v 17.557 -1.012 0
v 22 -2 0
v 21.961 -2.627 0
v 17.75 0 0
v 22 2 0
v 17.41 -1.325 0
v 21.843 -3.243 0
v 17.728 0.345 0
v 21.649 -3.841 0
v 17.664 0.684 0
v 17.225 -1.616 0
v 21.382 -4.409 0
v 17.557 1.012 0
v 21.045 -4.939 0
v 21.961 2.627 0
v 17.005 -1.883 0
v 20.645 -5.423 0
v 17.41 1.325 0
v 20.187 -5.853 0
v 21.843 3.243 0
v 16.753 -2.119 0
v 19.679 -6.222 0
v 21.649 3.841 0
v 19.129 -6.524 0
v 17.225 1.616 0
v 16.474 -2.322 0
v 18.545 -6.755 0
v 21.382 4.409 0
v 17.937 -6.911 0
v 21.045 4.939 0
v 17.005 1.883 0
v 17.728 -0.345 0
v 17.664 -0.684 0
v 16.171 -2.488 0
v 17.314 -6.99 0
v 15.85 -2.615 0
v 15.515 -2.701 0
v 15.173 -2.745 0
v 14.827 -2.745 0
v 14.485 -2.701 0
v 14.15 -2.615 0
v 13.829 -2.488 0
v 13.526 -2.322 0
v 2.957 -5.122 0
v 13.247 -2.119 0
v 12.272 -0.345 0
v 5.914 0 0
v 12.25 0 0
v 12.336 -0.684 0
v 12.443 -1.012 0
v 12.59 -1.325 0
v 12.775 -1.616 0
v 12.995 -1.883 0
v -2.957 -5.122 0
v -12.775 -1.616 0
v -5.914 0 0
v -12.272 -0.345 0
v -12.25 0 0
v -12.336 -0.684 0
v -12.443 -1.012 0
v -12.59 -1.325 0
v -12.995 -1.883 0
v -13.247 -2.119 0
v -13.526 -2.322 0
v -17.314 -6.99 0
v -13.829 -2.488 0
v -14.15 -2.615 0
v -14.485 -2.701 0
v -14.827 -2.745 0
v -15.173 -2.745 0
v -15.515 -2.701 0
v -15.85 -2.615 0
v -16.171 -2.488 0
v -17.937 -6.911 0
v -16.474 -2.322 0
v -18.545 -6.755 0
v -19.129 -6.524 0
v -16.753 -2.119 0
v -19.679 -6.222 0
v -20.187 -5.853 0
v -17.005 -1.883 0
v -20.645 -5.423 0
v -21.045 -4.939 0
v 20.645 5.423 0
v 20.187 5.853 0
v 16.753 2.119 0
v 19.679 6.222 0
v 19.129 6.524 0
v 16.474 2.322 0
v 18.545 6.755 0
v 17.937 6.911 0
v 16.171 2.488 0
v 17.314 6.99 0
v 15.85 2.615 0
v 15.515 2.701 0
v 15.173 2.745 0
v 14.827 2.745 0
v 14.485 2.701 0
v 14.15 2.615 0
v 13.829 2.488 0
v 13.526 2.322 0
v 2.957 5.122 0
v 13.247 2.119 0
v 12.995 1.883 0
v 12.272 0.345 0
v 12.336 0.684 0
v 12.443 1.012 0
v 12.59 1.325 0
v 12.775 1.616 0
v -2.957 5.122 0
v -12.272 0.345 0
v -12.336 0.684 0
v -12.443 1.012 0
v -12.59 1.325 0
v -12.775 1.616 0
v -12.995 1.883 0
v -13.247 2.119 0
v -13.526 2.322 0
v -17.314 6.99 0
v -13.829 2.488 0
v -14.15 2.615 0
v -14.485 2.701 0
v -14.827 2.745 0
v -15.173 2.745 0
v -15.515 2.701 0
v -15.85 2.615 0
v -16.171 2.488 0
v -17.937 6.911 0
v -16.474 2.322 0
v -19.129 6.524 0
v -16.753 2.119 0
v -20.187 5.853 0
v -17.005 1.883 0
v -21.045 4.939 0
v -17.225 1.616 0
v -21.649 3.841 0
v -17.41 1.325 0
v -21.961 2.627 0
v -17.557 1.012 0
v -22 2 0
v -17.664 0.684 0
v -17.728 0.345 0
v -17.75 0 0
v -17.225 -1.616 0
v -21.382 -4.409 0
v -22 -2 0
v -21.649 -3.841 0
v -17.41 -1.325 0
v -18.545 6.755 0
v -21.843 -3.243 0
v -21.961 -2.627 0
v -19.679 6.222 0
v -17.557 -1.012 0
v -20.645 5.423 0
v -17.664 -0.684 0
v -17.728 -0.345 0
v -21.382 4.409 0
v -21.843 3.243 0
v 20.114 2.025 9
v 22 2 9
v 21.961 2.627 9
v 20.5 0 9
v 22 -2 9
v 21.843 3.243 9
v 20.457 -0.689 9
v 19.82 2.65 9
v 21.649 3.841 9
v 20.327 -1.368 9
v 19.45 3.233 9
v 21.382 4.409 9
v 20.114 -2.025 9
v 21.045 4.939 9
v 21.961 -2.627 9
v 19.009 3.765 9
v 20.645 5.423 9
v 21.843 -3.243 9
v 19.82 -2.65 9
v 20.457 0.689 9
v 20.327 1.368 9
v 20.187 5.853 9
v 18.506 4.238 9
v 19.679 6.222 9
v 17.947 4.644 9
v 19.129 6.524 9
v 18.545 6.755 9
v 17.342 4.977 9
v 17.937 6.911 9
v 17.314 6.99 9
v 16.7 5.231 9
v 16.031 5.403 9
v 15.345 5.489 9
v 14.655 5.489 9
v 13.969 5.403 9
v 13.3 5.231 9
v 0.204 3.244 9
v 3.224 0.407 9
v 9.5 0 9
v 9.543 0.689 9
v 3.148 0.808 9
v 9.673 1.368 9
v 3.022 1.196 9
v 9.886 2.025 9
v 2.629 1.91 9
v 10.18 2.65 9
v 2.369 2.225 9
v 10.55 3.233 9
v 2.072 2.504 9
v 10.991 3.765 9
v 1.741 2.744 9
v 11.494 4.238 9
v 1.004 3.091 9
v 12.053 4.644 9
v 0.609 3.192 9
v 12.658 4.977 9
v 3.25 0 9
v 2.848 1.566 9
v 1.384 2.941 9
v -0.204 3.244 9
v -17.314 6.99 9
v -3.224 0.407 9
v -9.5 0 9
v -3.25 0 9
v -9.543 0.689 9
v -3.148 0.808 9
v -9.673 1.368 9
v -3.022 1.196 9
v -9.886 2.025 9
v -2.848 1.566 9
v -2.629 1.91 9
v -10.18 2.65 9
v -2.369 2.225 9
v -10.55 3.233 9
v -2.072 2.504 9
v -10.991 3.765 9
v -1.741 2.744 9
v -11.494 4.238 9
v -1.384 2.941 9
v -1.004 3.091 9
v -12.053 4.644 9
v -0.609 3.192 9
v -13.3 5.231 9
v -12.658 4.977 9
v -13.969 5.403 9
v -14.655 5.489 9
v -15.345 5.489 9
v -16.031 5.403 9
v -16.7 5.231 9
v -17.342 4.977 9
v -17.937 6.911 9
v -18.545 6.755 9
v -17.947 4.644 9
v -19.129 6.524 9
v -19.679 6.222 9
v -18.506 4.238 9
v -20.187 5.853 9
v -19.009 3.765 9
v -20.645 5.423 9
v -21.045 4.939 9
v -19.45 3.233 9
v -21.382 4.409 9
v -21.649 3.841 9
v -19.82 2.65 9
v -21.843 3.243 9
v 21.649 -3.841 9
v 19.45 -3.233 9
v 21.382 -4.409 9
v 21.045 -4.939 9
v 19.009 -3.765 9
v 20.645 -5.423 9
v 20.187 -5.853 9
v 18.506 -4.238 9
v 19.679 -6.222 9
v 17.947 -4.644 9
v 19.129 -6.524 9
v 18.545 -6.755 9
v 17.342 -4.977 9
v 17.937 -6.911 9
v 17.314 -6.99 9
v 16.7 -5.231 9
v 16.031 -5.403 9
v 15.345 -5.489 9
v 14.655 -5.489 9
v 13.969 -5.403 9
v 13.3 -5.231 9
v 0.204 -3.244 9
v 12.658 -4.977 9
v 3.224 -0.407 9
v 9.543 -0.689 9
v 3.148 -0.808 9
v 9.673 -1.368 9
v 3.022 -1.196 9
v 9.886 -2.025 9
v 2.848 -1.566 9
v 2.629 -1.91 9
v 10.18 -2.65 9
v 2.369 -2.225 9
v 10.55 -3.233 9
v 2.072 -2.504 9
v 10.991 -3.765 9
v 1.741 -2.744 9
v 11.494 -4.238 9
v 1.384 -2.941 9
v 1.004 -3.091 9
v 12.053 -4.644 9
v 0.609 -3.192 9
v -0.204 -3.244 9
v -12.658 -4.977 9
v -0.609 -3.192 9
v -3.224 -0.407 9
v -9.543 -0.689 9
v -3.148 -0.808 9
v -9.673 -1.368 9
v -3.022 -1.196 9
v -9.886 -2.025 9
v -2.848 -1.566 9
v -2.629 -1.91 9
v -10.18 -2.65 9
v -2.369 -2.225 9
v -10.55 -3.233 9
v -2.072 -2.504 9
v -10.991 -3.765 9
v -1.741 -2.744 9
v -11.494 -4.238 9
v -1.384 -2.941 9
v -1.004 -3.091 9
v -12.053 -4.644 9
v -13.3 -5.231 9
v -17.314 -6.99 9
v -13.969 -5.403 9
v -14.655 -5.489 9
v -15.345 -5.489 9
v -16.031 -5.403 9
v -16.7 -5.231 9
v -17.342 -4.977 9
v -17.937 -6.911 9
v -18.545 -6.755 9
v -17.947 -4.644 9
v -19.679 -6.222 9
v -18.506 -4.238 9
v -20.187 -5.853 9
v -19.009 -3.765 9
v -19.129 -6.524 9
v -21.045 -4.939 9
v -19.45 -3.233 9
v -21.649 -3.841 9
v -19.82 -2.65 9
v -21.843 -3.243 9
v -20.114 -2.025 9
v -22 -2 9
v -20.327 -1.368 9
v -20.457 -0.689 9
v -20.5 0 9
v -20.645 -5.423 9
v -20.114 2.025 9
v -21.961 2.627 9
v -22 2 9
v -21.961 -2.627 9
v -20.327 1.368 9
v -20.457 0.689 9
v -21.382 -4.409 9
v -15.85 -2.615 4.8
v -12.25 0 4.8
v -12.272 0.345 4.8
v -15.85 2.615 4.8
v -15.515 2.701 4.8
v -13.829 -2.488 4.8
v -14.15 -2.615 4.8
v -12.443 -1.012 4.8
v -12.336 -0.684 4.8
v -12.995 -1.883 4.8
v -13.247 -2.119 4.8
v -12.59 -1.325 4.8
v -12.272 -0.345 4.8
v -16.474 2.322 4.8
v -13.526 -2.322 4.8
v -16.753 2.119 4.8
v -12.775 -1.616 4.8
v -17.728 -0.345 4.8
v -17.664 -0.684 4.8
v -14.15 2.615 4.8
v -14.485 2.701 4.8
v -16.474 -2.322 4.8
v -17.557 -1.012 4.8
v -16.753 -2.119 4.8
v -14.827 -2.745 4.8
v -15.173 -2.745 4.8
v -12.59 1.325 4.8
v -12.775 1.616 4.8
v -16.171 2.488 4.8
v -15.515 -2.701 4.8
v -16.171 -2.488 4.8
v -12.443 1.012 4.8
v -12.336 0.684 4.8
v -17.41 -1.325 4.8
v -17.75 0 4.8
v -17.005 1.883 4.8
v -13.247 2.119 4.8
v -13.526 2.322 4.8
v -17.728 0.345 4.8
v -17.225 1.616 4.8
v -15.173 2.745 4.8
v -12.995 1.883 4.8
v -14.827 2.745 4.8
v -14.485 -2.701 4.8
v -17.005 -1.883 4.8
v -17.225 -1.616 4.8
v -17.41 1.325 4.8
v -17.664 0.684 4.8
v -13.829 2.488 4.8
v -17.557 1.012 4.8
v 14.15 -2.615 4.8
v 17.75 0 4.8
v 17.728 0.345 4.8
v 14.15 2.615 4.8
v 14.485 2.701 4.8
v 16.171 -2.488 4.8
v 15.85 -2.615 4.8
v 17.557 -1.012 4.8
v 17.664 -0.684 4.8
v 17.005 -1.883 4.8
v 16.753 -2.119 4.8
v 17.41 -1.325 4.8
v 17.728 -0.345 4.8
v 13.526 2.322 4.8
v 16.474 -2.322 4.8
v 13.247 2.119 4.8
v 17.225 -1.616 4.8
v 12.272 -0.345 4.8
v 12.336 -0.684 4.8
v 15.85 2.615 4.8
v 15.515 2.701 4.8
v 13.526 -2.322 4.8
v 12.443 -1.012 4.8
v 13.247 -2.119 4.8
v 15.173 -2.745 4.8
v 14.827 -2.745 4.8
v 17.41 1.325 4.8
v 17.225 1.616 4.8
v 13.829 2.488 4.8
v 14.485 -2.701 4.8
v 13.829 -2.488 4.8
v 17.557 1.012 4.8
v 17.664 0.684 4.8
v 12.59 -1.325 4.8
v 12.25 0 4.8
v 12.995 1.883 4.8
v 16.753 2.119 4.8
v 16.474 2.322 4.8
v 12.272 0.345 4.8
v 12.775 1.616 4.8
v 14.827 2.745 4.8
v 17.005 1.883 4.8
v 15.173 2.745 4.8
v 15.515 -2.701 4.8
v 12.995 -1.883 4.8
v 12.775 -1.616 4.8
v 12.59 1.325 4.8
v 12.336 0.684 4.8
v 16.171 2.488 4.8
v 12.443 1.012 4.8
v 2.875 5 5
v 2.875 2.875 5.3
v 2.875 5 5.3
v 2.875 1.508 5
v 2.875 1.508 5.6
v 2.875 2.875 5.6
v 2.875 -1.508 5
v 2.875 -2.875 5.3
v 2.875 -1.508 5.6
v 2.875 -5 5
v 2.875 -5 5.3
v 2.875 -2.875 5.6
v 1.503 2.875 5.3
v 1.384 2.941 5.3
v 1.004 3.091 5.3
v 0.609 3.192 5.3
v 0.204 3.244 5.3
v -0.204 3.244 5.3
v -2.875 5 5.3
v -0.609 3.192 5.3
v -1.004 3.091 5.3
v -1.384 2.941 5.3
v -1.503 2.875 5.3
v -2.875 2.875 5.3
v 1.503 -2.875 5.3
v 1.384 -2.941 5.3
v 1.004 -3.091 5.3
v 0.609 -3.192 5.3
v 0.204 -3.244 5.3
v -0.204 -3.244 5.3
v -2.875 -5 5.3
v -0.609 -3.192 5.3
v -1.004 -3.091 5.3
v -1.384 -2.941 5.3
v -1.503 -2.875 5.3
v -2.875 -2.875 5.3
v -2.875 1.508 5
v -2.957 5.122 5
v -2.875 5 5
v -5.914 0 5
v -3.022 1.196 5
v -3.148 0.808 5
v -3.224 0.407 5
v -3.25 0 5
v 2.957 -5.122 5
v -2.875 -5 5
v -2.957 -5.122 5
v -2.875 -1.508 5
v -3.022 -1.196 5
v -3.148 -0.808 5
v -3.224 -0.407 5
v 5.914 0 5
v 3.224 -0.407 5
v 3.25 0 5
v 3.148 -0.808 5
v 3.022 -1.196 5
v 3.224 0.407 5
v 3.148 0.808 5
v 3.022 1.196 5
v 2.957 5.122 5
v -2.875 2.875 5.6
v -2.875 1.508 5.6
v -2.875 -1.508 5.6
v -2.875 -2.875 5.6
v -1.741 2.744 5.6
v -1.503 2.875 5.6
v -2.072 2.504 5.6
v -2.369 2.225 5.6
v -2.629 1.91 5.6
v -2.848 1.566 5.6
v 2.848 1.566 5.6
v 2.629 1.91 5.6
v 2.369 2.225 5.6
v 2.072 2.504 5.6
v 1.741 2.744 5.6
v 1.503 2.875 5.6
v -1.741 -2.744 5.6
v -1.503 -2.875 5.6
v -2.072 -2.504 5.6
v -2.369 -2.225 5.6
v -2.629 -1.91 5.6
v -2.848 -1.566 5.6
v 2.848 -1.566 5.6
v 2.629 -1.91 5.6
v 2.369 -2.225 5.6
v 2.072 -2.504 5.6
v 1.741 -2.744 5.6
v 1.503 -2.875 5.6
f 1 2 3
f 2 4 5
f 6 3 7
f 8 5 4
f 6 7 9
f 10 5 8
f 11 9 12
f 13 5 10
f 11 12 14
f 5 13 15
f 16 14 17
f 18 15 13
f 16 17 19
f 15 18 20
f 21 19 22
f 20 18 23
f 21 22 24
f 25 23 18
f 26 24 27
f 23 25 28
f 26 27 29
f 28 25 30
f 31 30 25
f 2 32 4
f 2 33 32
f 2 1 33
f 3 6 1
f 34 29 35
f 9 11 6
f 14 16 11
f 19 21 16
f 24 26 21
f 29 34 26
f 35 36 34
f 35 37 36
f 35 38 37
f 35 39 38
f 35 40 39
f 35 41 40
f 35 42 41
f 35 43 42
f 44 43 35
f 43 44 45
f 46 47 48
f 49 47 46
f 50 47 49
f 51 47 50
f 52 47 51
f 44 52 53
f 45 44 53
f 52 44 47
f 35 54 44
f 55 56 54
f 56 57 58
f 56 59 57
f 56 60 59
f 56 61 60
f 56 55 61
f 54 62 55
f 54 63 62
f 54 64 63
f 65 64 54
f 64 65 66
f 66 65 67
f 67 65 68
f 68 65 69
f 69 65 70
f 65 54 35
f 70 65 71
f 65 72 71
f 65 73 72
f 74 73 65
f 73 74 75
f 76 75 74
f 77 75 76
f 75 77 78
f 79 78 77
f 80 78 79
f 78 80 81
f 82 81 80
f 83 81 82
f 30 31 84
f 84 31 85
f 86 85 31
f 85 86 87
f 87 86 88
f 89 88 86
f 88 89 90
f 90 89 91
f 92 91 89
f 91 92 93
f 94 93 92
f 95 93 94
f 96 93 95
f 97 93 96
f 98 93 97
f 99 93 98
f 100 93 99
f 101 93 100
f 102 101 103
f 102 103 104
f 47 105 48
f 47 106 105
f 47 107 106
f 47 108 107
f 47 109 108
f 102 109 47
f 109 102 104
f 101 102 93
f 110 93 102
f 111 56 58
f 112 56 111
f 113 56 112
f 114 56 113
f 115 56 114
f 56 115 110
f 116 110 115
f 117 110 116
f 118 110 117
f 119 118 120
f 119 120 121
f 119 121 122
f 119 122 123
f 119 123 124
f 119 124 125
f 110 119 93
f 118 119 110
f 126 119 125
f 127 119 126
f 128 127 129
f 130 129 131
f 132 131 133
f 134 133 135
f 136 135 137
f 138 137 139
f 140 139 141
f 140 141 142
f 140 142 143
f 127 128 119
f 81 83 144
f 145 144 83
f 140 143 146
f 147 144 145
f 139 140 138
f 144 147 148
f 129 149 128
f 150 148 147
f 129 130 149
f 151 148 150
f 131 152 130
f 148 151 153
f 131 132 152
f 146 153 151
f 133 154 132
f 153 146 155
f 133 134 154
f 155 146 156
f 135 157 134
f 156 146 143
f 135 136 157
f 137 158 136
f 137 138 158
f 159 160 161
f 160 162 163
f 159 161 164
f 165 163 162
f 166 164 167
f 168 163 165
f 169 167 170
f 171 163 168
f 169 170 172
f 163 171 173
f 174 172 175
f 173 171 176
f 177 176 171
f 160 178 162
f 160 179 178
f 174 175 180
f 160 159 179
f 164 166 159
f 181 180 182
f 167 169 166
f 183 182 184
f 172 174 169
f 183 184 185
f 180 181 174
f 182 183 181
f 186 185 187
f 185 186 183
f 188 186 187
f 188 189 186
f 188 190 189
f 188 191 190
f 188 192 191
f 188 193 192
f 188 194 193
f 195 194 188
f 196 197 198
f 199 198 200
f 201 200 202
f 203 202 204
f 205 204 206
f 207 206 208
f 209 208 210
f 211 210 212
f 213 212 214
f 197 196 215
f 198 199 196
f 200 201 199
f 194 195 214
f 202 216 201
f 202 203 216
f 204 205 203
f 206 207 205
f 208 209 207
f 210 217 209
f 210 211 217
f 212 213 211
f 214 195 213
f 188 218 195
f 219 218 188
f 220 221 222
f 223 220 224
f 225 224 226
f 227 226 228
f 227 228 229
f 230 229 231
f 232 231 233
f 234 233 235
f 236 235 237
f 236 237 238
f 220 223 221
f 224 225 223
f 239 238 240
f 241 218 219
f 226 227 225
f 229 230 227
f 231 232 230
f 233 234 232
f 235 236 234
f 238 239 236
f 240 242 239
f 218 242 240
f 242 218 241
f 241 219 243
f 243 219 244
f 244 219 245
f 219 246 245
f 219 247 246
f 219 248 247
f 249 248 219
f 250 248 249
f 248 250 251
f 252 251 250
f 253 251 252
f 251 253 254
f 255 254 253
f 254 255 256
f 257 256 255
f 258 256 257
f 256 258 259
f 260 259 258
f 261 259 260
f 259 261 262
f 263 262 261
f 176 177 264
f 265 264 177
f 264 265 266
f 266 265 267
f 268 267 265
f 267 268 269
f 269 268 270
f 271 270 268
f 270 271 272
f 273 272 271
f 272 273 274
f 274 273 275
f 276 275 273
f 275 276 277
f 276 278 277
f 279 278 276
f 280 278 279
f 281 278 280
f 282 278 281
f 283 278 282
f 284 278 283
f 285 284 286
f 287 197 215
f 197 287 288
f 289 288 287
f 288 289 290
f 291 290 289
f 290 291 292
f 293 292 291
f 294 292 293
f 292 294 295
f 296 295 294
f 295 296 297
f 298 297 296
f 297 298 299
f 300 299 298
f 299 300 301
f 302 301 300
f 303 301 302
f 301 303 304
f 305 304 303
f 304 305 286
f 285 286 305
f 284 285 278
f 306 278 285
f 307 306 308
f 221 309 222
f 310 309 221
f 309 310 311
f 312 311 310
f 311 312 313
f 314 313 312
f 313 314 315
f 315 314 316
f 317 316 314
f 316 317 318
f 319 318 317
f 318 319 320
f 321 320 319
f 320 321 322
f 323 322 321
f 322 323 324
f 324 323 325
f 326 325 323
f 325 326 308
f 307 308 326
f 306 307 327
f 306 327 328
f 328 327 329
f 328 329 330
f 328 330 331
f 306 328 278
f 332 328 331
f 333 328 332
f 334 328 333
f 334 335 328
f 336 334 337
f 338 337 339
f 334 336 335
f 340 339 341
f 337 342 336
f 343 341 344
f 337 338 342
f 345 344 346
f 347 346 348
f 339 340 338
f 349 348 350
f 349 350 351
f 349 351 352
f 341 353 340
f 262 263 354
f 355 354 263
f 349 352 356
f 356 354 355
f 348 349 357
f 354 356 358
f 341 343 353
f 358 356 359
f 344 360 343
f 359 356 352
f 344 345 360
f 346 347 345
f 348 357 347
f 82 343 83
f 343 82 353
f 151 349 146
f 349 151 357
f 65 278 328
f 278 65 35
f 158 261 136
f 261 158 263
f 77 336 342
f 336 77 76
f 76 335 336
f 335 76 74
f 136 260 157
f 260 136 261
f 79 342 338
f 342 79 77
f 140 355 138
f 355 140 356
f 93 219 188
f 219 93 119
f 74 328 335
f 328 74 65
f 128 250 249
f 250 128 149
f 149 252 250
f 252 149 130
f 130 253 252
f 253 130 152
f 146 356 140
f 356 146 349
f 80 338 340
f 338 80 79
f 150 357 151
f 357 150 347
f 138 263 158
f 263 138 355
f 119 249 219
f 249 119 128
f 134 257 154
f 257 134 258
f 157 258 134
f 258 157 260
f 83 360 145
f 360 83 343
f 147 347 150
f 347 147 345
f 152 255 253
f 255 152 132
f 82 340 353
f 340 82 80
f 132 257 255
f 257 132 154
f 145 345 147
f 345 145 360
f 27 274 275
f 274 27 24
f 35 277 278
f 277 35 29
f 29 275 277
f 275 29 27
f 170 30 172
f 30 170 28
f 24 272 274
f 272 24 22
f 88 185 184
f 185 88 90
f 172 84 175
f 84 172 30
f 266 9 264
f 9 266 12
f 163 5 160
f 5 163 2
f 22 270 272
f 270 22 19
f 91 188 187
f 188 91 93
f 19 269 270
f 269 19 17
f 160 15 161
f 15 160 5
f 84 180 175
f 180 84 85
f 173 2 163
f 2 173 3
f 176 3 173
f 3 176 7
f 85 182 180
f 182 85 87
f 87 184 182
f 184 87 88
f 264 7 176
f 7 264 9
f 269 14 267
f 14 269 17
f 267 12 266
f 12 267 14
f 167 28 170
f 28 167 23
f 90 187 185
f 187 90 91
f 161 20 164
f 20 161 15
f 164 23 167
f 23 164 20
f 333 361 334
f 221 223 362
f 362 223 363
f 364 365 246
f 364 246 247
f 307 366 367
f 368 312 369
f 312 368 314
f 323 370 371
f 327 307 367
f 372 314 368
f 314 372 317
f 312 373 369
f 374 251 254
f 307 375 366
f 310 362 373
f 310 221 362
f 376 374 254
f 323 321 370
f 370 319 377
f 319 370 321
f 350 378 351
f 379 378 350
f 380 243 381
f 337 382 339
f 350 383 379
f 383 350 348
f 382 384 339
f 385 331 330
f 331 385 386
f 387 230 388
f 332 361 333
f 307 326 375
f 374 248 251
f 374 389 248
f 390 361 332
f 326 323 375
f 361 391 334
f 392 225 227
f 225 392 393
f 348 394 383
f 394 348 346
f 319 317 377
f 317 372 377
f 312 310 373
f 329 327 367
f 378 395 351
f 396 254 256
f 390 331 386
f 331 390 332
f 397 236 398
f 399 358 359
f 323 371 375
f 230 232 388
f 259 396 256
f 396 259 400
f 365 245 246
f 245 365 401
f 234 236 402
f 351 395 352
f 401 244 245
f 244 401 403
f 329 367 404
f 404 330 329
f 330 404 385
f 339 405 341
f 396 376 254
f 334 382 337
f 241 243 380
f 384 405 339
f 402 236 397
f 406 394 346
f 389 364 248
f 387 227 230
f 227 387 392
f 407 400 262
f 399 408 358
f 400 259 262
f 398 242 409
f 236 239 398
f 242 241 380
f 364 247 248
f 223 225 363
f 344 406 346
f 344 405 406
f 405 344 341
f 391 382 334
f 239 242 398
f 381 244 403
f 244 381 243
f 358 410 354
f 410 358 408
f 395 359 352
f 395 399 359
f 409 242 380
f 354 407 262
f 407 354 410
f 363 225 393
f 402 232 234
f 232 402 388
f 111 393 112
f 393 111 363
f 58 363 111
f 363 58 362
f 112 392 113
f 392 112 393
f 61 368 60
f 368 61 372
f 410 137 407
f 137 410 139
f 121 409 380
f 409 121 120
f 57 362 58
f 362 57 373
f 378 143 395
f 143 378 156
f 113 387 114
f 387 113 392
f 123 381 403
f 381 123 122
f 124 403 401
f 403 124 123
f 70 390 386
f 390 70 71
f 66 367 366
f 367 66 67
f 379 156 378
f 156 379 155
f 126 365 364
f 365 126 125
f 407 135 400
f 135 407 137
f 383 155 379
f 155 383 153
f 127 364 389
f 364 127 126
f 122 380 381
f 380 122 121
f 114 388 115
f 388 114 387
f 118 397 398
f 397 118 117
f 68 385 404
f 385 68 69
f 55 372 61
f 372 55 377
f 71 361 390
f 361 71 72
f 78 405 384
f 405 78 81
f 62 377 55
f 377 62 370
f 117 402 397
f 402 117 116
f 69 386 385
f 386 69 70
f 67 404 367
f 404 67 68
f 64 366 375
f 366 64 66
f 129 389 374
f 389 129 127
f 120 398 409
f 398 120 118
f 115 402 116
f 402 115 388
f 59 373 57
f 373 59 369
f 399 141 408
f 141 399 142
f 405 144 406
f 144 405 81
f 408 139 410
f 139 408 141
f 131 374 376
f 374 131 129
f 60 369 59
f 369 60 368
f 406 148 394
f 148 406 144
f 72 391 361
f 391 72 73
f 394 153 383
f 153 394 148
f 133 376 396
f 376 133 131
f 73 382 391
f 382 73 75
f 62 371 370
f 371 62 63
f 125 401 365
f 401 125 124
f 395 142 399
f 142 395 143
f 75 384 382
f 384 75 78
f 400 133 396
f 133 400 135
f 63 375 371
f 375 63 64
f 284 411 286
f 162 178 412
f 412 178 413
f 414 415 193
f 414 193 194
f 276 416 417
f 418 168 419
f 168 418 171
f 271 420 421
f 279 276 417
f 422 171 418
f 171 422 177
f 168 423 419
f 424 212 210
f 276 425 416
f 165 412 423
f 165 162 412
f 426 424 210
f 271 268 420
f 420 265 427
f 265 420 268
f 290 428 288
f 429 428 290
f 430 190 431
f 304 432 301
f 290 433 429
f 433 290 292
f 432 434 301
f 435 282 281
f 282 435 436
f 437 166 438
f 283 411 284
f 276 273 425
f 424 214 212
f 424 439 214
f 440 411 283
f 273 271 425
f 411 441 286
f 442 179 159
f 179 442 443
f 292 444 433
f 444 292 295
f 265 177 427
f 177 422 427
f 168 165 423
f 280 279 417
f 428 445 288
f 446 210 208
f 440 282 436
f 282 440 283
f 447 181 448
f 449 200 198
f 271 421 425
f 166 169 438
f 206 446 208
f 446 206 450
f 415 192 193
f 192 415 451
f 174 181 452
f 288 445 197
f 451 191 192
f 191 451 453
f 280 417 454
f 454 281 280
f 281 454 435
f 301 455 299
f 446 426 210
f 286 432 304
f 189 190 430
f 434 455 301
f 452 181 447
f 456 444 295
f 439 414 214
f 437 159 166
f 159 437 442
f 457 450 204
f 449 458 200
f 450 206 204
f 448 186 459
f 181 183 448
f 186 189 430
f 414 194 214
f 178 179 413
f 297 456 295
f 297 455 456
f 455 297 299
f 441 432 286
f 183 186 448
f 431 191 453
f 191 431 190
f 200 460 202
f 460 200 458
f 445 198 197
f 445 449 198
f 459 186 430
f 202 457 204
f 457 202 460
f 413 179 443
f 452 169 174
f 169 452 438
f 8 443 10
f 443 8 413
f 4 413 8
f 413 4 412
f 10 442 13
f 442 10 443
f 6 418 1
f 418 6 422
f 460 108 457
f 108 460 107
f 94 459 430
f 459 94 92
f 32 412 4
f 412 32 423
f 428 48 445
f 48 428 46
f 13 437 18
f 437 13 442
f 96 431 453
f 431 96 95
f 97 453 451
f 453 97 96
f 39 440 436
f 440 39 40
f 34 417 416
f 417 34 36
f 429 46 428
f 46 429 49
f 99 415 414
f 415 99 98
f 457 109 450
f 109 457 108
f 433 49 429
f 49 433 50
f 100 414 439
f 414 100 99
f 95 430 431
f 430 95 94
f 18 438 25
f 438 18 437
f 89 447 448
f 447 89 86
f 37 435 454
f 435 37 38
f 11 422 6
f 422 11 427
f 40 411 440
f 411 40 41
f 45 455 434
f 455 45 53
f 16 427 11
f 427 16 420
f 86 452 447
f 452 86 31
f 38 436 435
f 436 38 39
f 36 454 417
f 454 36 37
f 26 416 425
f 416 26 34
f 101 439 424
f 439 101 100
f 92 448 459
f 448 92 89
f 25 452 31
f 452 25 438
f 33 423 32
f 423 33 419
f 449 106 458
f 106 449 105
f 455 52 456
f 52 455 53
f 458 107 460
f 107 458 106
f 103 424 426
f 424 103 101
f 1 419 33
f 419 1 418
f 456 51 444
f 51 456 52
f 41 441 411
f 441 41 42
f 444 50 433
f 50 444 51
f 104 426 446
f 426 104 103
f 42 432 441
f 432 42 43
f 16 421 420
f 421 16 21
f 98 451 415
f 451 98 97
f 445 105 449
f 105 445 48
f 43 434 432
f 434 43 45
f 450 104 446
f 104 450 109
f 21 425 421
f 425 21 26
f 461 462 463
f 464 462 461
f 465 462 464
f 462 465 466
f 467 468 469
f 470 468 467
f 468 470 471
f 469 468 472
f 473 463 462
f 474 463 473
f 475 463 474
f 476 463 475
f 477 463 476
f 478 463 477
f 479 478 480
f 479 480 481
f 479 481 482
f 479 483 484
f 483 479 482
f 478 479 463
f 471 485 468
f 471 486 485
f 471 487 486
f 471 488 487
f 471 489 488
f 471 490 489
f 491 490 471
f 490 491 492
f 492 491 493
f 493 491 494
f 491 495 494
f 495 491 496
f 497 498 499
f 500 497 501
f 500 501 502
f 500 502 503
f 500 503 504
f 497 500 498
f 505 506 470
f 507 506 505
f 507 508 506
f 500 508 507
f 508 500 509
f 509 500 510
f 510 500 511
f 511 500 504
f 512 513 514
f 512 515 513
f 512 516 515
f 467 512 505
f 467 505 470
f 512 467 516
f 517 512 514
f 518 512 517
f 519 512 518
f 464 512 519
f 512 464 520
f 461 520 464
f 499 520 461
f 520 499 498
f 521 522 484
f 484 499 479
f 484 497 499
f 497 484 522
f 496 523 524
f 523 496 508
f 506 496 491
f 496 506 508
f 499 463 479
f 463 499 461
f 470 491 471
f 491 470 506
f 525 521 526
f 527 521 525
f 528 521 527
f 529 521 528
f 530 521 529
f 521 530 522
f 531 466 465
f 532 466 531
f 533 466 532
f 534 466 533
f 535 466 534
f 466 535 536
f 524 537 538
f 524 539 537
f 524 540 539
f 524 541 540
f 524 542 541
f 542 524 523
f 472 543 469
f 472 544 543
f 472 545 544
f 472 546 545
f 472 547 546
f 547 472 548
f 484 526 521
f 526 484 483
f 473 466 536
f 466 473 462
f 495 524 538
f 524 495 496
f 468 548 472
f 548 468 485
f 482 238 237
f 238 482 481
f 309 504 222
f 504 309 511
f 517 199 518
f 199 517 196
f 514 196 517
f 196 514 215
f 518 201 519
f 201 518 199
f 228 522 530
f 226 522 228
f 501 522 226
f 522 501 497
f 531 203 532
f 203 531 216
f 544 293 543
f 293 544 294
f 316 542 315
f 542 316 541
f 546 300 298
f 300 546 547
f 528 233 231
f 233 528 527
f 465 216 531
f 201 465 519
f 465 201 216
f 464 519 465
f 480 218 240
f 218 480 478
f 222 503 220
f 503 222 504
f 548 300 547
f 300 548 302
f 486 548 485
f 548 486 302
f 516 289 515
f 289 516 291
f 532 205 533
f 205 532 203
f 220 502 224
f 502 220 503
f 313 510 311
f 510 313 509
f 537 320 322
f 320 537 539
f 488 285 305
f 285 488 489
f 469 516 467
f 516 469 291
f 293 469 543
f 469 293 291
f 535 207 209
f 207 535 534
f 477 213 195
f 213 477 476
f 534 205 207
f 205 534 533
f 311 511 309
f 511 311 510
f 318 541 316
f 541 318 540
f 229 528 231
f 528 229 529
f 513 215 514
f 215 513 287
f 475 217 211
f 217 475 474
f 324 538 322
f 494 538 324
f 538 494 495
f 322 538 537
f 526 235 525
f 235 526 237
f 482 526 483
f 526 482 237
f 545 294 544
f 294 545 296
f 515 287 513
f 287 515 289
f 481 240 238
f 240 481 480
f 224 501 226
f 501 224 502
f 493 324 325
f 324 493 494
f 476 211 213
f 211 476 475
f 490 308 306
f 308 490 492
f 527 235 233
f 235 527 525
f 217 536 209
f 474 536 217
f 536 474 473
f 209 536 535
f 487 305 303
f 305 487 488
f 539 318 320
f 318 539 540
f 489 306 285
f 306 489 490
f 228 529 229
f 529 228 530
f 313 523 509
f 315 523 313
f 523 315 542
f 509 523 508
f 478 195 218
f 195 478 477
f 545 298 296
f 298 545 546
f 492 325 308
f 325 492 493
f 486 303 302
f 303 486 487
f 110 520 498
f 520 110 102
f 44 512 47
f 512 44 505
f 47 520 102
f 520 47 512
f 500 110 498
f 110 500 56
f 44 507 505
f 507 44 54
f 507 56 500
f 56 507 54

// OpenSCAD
$fn = 50;


difference() {
	union() {
		cylinder(h = 9, r = 7.0000000000);
		translate(v = [-7.5000000000, 0.0000000000, 0]) {
			hull() {
				translate(v = [-9.5000000000, 2.0000000000, 0]) {
					cylinder(h = 9, r = 5);
				}
				translate(v = [9.5000000000, 2.0000000000, 0]) {
					cylinder(h = 9, r = 5);
				}
				translate(v = [-9.5000000000, -2.0000000000, 0]) {
					cylinder(h = 9, r = 5);
				}
				translate(v = [9.5000000000, -2.0000000000, 0]) {
					cylinder(h = 9, r = 5);
				}
			}
		}
		translate(v = [-7.5000000000, 0.0000000000, 0]) {
			hull() {
				translate(v = [-9.5000000000, 2.0000000000, 0]) {
					cylinder(h = 9, r = 5);
				}
				translate(v = [9.5000000000, 2.0000000000, 0]) {
					cylinder(h = 9, r = 5);
				}
				translate(v = [-9.5000000000, -2.0000000000, 0]) {
					cylinder(h = 9, r = 5);
				}
				translate(v = [9.5000000000, -2.0000000000, 0]) {
					cylinder(h = 9, r = 5);
				}
			}
		}
		translate(v = [7.5000000000, 0.0000000000, 0]) {
			hull() {
				translate(v = [-9.5000000000, 2.0000000000, 0]) {
					cylinder(h = 9, r = 5);
				}
				translate(v = [9.5000000000, 2.0000000000, 0]) {
					cylinder(h = 9, r = 5);
				}
				translate(v = [-9.5000000000, -2.0000000000, 0]) {
					cylinder(h = 9, r = 5);
				}
				translate(v = [9.5000000000, -2.0000000000, 0]) {
					cylinder(h = 9, r = 5);
				}
			}
		}
		translate(v = [7.5000000000, 0.0000000000, 0]) {
			hull() {
				translate(v = [-9.5000000000, 2.0000000000, 0]) {
					cylinder(h = 9, r = 5);
				}
				translate(v = [9.5000000000, 2.0000000000, 0]) {
					cylinder(h = 9, r = 5);
				}
				translate(v = [-9.5000000000, -2.0000000000, 0]) {
					cylinder(h = 9, r = 5);
				}
				translate(v = [9.5000000000, -2.0000000000, 0]) {
					cylinder(h = 9, r = 5);
				}
			}
		}
	}
	union() {
		translate(v = [-15.0000000000, 0.0000000000, 9]) {
			rotate(a = [0, 0, 0]) {
				difference() {
					union() {
						#translate(v = [0, 0, -9.0000000000]) {
							cylinder(h = 9, r = 2.2500000000);
						}
						#translate(v = [0, 0, -4.2000000000]) {
							cylinder(h = 4.2000000000, r1 = 2.7500000000, r2 = 5.5000000000);
						}
						#translate(v = [0, 0, -9.0000000000]) {
							cylinder(h = 9, r = 2.7500000000);
						}
						#translate(v = [0, 0, -9.0000000000]) {
							cylinder(h = 9, r = 2.2500000000);
						}
					}
					union();
				}
			}
		}
		translate(v = [-15.0000000000, 0.0000000000, 9]) {
			rotate(a = [0, 0, 0]) {
				difference() {
					union() {
						#translate(v = [0, 0, -9.0000000000]) {
							cylinder(h = 9, r = 2.2500000000);
						}
						#translate(v = [0, 0, -4.2000000000]) {
							cylinder(h = 4.2000000000, r1 = 2.7500000000, r2 = 5.5000000000);
						}
						#translate(v = [0, 0, -9.0000000000]) {
							cylinder(h = 9, r = 2.7500000000);
						}
						#translate(v = [0, 0, -9.0000000000]) {
							cylinder(h = 9, r = 2.2500000000);
						}
					}
					union();
				}
			}
		}
		translate(v = [15.0000000000, 0.0000000000, 9]) {
			rotate(a = [0, 0, 0]) {
				difference() {
					union() {
						#translate(v = [0, 0, -9.0000000000]) {
							cylinder(h = 9, r = 2.2500000000);
						}
						#translate(v = [0, 0, -4.2000000000]) {
							cylinder(h = 4.2000000000, r1 = 2.7500000000, r2 = 5.5000000000);
						}
						#translate(v = [0, 0, -9.0000000000]) {
							cylinder(h = 9, r = 2.7500000000);
						}
						#translate(v = [0, 0, -9.0000000000]) {
							cylinder(h = 9, r = 2.2500000000);
						}
					}
					union();
				}
			}
		}
		translate(v = [15.0000000000, 0.0000000000, 9]) {
			rotate(a = [0, 0, 0]) {
				difference() {
					union() {
						#translate(v = [0, 0, -9.0000000000]) {
							cylinder(h = 9, r = 2.2500000000);
						}
						#translate(v = [0, 0, -4.2000000000]) {
							cylinder(h = 4.2000000000, r1 = 2.7500000000, r2 = 5.5000000000);
						}
						#translate(v = [0, 0, -9.0000000000]) {
							cylinder(h = 9, r = 2.7500000000);
						}
						#translate(v = [0, 0, -9.0000000000]) {
							cylinder(h = 9, r = 2.2500000000);
						}
					}
					union();
				}
			}
		}
		translate(v = [0.0000000000, 0.0000000000, 0]) {
			rotate(a = [0, 0, 0]) {
				difference() {
					union() {
						#translate(v = [-2.8750000000, -5.0000000000, -0.3000000000]) {
							cube(size = [5.7500000000, 10, 0.3000000000]);
						}
						#translate(v = [-2.8750000000, -2.8750000000, -0.6000000000]) {
							cube(size = [5.7500000000, 5.7500000000, 0.3000000000]);
						}
						#translate(v = [-2.8750000000, -5.0000000000, 5]) {
							cube(size = [5.7500000000, 10, 0.3000000000]);
						}
						#translate(v = [-2.8750000000, -2.8750000000, 5.3000000000]) {
							cube(size = [5.7500000000, 5.7500000000, 0.3000000000]);
						}
						#translate(v = [0, 0, -100.0000000000]) {
							cylinder(h = 200, r = 3.2500000000);
						}
						#linear_extrude(height = 5) {
							polygon(points = [[5.9142500000, 0.0000000000], [2.9571250000, 5.1218907443], [-2.9571250000, 5.1218907443], [-5.9142500000, 0.0000000000], [-2.9571250000, -5.1218907443], [2.9571250000, -5.1218907443]]);
						}
						#translate(v = [-2.8750000000, -5.0000000000, -0.3000000000]) {
							cube(size = [5.7500000000, 10, 0.3000000000]);
						}
						#translate(v = [-2.8750000000, -2.8750000000, -0.6000000000]) {
							cube(size = [5.7500000000, 5.7500000000, 0.3000000000]);
						}
						#translate(v = [-2.8750000000, -5.0000000000, 5]) {
							cube(size = [5.7500000000, 10, 0.3000000000]);
						}
						#translate(v = [-2.8750000000, -2.8750000000, 5.3000000000]) {
							cube(size = [5.7500000000, 5.7500000000, 0.3000000000]);
						}
						#translate(v = [0, 0, -100.0000000000]) {
							cylinder(h = 200, r = 3.2500000000);
						}
						#translate(v = [-2.8750000000, -5.0000000000, -0.3000000000]) {
							cube(size = [5.7500000000, 10, 0.3000000000]);
						}
						#translate(v = [-2.8750000000, -2.8750000000, -0.6000000000]) {
							cube(size = [5.7500000000, 5.7500000000, 0.3000000000]);
						}
						#translate(v = [-2.8750000000, -5.0000000000, 5]) {
							cube(size = [5.7500000000, 10, 0.3000000000]);
						}
						#translate(v = [-2.8750000000, -2.8750000000, 5.3000000000]) {
							cube(size = [5.7500000000, 5.7500000000, 0.3000000000]);
						}
						#translate(v = [0, 0, -100.0000000000]) {
							cylinder(h = 200, r = 3.2500000000);
						}
					}
					union();
				}
			}
		}
		translate(v = [0, 0, -100]) {
			cylinder(h = 200, r = 3.2500000000);
		}
		translate(v = [0, 0, -100]) {
			cylinder(h = 200, r = 1.8000000000);
		}
	}
}
